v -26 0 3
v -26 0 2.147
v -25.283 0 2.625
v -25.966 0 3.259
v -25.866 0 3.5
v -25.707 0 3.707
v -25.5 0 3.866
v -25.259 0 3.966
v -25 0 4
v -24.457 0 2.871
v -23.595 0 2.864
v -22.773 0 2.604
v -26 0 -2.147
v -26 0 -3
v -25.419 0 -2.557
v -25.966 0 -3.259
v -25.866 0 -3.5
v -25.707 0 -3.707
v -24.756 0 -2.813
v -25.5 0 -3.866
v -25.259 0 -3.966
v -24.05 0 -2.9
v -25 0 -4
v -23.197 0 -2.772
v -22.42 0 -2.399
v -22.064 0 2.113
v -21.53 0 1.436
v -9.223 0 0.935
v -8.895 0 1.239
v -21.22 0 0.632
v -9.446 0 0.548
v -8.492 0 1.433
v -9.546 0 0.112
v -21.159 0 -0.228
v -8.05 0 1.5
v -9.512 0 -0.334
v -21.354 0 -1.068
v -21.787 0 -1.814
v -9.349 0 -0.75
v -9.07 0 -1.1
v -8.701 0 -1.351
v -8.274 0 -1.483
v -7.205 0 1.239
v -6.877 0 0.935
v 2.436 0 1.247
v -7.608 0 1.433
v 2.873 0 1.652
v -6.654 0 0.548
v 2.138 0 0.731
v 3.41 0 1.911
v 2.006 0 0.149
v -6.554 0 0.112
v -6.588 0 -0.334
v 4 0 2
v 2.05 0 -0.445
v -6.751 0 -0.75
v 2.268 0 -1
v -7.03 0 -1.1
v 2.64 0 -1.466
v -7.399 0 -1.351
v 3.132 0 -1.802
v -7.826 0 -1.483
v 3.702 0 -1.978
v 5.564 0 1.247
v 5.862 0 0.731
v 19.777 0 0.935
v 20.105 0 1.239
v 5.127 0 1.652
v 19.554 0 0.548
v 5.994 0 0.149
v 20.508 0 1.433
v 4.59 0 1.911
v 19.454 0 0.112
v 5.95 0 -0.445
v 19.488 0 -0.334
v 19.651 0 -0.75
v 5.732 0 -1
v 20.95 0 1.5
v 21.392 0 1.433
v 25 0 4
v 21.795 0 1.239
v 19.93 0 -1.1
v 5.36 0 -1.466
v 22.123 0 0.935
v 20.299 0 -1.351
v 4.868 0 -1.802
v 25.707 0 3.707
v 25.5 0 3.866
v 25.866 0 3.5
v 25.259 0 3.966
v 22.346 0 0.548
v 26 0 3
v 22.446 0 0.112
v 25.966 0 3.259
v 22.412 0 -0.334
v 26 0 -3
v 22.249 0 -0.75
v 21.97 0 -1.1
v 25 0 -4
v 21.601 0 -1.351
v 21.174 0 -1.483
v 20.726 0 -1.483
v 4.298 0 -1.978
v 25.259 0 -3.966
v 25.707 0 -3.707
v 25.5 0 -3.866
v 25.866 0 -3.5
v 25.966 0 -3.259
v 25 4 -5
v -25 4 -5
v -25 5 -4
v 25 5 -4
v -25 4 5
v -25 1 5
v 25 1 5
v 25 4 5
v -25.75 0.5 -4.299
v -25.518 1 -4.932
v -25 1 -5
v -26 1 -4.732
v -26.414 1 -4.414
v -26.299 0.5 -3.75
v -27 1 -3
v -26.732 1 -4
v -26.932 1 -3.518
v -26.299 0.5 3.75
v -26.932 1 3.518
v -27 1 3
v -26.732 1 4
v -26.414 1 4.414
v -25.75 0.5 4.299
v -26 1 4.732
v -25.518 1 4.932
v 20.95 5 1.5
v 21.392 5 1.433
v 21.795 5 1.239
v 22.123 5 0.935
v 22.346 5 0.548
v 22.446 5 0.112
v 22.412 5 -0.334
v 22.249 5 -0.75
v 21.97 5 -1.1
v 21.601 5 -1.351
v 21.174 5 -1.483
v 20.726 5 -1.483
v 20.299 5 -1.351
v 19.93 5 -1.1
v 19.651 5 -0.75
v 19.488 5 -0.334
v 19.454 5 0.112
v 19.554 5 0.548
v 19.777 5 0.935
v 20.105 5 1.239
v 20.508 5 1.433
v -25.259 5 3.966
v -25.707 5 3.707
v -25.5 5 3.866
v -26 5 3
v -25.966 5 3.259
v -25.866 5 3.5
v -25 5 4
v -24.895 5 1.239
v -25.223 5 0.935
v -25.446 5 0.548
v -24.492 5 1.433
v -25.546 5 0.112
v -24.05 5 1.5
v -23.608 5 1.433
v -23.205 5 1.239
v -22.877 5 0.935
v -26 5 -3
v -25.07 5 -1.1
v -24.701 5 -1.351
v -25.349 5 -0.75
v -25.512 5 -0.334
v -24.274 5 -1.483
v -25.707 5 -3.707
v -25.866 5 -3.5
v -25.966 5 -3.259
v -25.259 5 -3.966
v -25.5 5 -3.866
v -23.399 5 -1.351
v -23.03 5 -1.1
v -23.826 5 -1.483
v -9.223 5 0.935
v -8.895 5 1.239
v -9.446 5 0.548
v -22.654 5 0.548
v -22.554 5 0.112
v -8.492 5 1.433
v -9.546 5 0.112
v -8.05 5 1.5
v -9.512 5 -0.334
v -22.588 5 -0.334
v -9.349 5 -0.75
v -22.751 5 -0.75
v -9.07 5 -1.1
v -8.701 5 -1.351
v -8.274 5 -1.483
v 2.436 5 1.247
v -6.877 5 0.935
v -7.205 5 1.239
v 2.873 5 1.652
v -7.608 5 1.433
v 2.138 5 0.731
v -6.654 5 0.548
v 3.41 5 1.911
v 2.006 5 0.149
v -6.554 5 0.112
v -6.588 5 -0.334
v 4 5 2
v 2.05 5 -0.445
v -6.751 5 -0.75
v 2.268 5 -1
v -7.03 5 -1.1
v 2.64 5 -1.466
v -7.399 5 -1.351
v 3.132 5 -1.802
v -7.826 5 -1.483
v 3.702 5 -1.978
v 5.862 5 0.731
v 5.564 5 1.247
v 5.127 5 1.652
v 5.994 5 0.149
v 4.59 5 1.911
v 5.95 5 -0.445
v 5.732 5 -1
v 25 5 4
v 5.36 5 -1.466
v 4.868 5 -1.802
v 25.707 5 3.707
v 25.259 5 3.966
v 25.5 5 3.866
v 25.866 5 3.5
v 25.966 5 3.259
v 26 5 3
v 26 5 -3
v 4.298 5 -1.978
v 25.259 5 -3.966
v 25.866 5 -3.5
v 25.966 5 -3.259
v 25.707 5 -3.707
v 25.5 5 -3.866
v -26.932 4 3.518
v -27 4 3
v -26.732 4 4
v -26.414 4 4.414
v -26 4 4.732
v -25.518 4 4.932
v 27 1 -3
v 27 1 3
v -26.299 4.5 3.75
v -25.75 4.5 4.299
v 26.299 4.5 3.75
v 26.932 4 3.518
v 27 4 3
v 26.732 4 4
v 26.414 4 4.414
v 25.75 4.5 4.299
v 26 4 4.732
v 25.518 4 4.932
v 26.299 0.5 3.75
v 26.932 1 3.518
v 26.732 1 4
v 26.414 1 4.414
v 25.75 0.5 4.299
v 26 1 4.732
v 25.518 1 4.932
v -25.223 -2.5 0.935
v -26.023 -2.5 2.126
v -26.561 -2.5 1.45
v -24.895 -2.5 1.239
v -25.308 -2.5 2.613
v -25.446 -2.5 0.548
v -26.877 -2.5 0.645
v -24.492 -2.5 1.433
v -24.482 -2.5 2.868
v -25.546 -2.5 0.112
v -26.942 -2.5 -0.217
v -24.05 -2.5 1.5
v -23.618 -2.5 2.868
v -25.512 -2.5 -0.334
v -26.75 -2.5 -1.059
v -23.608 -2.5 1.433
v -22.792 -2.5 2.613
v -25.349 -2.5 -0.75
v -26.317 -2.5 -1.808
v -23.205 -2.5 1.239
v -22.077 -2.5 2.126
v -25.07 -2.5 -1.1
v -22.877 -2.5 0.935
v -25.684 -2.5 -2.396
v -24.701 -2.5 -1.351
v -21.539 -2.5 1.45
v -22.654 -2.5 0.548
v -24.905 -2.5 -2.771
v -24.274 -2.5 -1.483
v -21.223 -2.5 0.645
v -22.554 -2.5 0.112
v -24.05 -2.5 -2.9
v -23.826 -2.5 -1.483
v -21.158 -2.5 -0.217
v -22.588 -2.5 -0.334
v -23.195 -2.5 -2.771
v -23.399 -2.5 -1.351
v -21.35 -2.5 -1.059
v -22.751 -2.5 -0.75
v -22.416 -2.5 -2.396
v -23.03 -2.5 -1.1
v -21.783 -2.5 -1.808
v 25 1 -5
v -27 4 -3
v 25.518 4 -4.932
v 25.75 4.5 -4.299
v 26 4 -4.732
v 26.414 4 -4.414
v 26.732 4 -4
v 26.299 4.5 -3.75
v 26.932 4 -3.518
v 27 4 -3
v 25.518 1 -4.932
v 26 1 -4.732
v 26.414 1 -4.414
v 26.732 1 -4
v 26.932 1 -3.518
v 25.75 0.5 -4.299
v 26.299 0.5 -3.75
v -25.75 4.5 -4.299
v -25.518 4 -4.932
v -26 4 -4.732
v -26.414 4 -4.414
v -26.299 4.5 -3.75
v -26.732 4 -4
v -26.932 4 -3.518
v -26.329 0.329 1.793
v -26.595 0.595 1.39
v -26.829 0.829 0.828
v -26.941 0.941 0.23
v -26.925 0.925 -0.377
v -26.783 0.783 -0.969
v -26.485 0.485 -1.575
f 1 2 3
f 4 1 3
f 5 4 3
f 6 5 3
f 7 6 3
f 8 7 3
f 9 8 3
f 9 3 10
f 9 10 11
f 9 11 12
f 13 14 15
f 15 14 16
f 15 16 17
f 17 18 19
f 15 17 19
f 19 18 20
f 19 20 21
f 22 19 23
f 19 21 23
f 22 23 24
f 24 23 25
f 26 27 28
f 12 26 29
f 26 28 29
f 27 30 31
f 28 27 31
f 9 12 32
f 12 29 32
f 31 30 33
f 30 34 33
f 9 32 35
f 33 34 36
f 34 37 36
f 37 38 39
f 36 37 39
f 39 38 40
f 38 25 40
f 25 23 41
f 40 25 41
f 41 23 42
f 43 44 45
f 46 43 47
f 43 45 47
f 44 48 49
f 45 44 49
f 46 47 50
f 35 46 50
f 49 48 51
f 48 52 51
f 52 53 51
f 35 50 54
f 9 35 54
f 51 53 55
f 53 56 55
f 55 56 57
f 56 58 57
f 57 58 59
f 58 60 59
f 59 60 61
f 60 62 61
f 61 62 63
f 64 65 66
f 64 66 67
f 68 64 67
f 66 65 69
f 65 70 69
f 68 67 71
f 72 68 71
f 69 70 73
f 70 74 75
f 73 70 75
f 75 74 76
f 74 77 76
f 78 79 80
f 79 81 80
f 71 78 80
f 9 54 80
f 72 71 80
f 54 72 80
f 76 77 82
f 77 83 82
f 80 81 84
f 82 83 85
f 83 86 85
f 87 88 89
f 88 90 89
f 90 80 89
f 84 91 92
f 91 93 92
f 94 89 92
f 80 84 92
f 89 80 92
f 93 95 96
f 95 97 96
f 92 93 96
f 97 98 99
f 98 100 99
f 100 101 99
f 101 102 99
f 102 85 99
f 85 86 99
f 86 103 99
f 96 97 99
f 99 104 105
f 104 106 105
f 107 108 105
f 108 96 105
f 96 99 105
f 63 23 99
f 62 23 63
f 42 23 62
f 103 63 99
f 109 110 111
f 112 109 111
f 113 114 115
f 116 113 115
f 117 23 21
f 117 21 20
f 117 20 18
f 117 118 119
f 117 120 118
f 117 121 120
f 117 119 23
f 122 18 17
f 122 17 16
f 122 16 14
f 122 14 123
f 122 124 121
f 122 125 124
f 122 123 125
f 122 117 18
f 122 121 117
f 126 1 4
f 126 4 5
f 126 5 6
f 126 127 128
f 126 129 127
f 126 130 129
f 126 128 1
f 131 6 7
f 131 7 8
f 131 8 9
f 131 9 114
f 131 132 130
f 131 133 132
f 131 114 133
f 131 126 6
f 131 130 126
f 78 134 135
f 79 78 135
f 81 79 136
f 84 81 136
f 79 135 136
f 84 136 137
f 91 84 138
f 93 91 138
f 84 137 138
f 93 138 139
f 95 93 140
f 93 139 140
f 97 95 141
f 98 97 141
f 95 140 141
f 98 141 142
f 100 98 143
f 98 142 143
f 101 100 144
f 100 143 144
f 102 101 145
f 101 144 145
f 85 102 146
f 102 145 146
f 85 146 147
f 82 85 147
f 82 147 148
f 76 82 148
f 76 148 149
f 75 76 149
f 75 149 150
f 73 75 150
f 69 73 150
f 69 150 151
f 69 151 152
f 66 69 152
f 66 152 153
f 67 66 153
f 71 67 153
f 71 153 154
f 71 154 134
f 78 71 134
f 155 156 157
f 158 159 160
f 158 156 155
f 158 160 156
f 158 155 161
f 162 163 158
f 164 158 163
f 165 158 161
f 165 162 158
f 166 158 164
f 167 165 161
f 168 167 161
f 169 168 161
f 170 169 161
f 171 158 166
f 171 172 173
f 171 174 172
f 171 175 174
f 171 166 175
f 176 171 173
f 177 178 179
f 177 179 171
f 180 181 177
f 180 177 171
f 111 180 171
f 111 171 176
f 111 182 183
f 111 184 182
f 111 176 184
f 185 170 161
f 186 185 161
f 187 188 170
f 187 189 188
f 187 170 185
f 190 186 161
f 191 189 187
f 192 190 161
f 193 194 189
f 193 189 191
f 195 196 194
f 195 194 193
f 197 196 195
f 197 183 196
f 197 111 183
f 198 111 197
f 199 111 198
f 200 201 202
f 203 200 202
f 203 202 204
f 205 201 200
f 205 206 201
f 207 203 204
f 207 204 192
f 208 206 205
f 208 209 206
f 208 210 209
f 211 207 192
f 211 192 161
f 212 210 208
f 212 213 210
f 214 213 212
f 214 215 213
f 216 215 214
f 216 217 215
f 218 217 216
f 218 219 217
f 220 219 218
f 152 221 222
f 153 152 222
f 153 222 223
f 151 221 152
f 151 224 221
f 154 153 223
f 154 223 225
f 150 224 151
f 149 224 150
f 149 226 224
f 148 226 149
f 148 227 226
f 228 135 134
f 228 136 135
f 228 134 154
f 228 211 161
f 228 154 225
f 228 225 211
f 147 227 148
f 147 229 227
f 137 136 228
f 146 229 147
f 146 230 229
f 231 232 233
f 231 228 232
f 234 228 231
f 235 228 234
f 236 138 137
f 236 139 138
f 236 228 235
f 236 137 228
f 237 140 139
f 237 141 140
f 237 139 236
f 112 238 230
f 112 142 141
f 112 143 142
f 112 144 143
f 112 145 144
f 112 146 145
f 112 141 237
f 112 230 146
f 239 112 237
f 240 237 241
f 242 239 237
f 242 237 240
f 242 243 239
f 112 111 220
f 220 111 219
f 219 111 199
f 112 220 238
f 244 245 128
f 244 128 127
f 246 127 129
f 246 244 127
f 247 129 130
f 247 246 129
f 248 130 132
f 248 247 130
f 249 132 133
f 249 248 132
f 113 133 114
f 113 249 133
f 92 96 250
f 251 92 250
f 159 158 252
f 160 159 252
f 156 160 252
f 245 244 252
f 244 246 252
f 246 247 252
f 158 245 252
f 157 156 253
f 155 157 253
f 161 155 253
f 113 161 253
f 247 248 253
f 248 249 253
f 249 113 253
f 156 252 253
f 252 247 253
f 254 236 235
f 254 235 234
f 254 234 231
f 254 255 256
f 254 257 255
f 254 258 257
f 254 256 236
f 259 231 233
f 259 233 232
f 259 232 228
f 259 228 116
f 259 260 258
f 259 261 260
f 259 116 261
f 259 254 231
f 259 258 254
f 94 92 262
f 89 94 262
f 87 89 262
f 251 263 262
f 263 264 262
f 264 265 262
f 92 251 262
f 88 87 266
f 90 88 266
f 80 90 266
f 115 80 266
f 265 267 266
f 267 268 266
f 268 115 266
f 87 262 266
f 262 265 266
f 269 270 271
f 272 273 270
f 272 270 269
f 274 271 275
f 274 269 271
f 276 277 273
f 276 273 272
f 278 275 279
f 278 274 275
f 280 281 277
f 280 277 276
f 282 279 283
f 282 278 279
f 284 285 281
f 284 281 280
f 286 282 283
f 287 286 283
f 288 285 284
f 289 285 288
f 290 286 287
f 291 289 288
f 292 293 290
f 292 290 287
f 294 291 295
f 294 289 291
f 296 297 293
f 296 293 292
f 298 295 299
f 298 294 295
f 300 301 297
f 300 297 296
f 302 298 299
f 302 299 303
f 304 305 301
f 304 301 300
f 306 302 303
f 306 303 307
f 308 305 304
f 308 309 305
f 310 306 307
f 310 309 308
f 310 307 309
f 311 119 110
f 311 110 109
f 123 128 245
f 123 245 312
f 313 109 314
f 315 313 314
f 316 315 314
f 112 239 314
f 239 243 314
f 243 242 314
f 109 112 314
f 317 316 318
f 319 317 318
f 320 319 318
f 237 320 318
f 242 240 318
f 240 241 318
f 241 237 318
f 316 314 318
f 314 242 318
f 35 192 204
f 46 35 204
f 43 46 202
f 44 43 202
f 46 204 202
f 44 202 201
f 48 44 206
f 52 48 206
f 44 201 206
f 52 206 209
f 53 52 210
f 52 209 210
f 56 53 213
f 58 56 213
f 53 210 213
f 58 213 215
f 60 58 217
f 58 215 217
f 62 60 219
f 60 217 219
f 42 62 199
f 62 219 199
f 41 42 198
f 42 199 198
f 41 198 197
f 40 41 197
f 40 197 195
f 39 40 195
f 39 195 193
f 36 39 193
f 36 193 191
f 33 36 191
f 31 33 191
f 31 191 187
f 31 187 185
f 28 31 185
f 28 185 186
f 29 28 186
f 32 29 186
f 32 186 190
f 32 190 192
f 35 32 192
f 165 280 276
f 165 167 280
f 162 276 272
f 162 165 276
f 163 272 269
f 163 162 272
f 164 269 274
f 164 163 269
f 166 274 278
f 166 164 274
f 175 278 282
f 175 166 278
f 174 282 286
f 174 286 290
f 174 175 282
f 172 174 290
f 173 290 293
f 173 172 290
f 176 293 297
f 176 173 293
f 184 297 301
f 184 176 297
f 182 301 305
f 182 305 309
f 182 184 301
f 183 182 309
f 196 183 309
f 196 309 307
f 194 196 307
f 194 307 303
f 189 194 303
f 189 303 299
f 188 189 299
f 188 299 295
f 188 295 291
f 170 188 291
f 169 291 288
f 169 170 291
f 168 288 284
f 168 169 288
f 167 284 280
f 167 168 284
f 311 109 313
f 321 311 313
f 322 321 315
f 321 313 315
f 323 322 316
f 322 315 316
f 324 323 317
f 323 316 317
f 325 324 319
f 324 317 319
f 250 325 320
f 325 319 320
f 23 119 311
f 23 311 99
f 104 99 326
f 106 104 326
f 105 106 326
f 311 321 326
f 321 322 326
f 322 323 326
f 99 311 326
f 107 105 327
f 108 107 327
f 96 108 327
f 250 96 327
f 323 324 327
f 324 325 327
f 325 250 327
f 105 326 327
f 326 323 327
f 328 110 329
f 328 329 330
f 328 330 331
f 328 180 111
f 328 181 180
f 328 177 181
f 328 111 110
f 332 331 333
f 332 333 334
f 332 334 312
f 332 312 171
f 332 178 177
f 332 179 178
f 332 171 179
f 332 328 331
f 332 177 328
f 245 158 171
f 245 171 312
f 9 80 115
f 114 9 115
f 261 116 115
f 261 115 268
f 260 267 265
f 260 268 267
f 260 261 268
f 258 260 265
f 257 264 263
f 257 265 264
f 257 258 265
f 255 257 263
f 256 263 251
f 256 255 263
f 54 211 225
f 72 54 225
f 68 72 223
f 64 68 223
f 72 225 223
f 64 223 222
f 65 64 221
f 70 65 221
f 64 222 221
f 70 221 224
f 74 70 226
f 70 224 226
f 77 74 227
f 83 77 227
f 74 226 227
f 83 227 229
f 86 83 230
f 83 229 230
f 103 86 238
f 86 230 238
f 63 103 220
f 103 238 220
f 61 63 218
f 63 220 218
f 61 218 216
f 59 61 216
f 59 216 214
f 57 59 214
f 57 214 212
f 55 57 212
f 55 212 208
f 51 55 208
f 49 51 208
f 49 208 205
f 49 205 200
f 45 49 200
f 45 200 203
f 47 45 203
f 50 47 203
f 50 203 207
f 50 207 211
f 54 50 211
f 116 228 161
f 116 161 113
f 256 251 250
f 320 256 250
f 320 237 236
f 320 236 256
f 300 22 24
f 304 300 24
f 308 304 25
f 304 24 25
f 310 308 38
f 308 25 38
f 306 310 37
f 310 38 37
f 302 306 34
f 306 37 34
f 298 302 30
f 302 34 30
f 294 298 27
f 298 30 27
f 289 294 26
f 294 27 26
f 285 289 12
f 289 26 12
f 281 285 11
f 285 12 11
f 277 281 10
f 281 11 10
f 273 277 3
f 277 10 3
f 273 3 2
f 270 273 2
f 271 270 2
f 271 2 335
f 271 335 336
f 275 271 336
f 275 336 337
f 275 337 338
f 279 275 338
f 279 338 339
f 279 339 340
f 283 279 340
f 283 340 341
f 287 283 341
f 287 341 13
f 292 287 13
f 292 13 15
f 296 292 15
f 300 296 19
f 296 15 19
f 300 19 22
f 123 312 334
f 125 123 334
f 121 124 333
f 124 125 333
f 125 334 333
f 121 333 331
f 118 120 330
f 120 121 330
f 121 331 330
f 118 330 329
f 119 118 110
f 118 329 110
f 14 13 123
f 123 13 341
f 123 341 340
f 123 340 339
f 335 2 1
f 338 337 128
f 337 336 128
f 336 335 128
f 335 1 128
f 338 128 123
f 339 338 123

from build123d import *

# Parameters (mm, degrees)
SKETCH1_W           = 54
SKETCH1_H           = 10
BOSS_EXTRUDE1_DEPTH = 5
SKETCH3_R           = 1.5
SKETCH3_R_2         = 2
CUT_EXTRUDE1_DEPTH  = 7
FILLET1_R           = 2
SKETCH4_R           = 2.9
SKETCH4_R_2         = 1.5
BOSS_EXTRUDE2_DEPTH = 2.5
CHAMFER1_SIZE       = 1


with BuildPart() as part:
    # Sketch1 → Boss-Extrude1 (new body)
    with BuildSketch(Plane(origin=(0, 0, 0), x_dir=(1, 0, 0), z_dir=(0, 1, 0))):
        Rectangle(SKETCH1_W, SKETCH1_H)
    extrude(amount=BOSS_EXTRUDE1_DEPTH)

    # Sketch3 → Cut-Extrude1 (cut)
    with BuildSketch(Plane(origin=(0, 5, 0), x_dir=(1, 0, 0), z_dir=(0, 1, 0))):
        with Locations(Location((-24.05, 0, 0), (0, 0, 270))):
            Circle(SKETCH3_R)
        with Locations(Location((4, 0, 0), (0, 0, 270))):
            Circle(SKETCH3_R_2)
        with Locations(Location((-8.05, 0, 0), (0, 0, 270))):
            Circle(SKETCH3_R)
        with Locations(Location((20.95, 0, 0), (0, 0, 270))):
            Circle(SKETCH3_R)
    extrude(amount=-CUT_EXTRUDE1_DEPTH, mode=Mode.SUBTRACT)

    # Fillet1
    fillet1_edges = [part.edges().sort_by_distance(p)[0] for p in [
        (27, 2.5, 5),
        (-27, 2.5, 5),
        (-27, 2.5, -5),
        (27, 2.5, -5),
    ]]
    fillet(fillet1_edges, radius=FILLET1_R)

    # Sketch4 → Boss-Extrude2 (add)
    with BuildSketch(Plane.XZ):
        with Locations(Location((-24.05, 0, 0), (0, 0, 270))):
            Circle(SKETCH4_R)
        with Locations(Location((-24.05, 0, 0), (0, 0, 90))):
            Circle(SKETCH4_R_2, mode=Mode.SUBTRACT)
    extrude(amount=BOSS_EXTRUDE2_DEPTH)

    # Chamfer1
    # the kernel refuses this chamfer: 1 mm, written as the material it takes off along each edge
    with BuildSketch(Plane(origin=(-25, 0, -5), x_dir=(0, 0.9996219169112968, -0.027495876610586494), z_dir=(1, 0, 0)), Plane(origin=(25, 5, 5), x_dir=(0, 0.027495876610586487, -0.9996219169112968), z_dir=(-1, 0, 0))) as chamfer1_piece_1:
        Polygon((CHAMFER1_SIZE * 0.999621916911, CHAMFER1_SIZE * 0.0274958766106), (-CHAMFER1_SIZE * 0.0274958766106, CHAMFER1_SIZE * 0.999621916911), (0, 0), align=None)
    extrude(amount=50, mode=Mode.SUBTRACT)
    with BuildSketch(Plane(origin=(-25, 5, -5), x_dir=(0, -0.9996219169112968, -0.027495876610586487), z_dir=(1, 0, 0)), Plane(origin=(25, 0, 5), x_dir=(0, -0.027495876610586365, -0.9996219169112968), z_dir=(-1, 0, 0))) as chamfer1_piece_2:
        Polygon((CHAMFER1_SIZE * 0.999621916911, -CHAMFER1_SIZE * 0.0274958766106), (-CHAMFER1_SIZE * 0.0274958766106, -CHAMFER1_SIZE * 0.999621916911), (0, 0), align=None)
    extrude(amount=50, mode=Mode.SUBTRACT)
    with BuildSketch(Plane(origin=(27, 0, -3), x_dir=(-0.9996219169112968, -0.02749587661058639, 0), z_dir=(0, 0, 1))) as chamfer1_piece_3:
        Polygon((CHAMFER1_SIZE * 0.999621916911, -CHAMFER1_SIZE * 0.0274958766106), (-CHAMFER1_SIZE * 0.0274958766106, -CHAMFER1_SIZE * 0.999621916911), (0, 0), align=None)
    extrude(amount=6, mode=Mode.SUBTRACT)
    with BuildSketch(Plane(origin=(-27, 0, 3), x_dir=(0.9996219169112968, -0.02749587661058639, 0), z_dir=(0, 0, -1))) as chamfer1_piece_4_section:
        Polygon((CHAMFER1_SIZE * 0.999621916911, -CHAMFER1_SIZE * 0.0274958766106), (-CHAMFER1_SIZE * 0.0274958766106, -CHAMFER1_SIZE * 0.999621916911), (0, 0), align=None)
    chamfer1_piece_4 = extrude(amount=6, mode=Mode.PRIVATE)
    chamfer1_piece_4 = chamfer1_piece_4 - Plane(origin=(-24.05, 0.490897833, 0), x_dir=(0, 0, -1), z_dir=(0, 1, 0)) * Cylinder(2.9, 16, mode=Mode.PRIVATE)
    add(chamfer1_piece_4, mode=Mode.SUBTRACT)
    with BuildSketch(Plane(origin=(-25, 0, 3), x_dir=(-1, 0, 0), z_dir=(0, 0, -1))) as chamfer1_piece_5:
        Polygon((2 - CHAMFER1_SIZE, 0), (2, CHAMFER1_SIZE), (2, 0), align=None)
    revolve(axis=Axis((-25, 0, 3), (0, 1, 0)), revolution_arc=90, mode=Mode.SUBTRACT)
    with BuildSketch(Plane(origin=(25, 0, 3), x_dir=(1, 0, 0), z_dir=(0, 0, -1))) as chamfer1_piece_6:
        Polygon((2 - CHAMFER1_SIZE, 0), (2, -CHAMFER1_SIZE), (2, 0), align=None)
    revolve(axis=Axis((25, 0, 3), (0, -1, 0)), revolution_arc=90, mode=Mode.SUBTRACT)
    with BuildSketch(Plane(origin=(-25, 0, -3), x_dir=(0, 0, -1), z_dir=(1, 0, 0))) as chamfer1_piece_7:
        Polygon((2 - CHAMFER1_SIZE, 0), (2, CHAMFER1_SIZE), (2, 0), align=None)
    revolve(axis=Axis((-25, 0, -3), (0, 1, 0)), revolution_arc=90, mode=Mode.SUBTRACT)
    with BuildSketch(Plane(origin=(25, 0, -3), x_dir=(0, 0, -1), z_dir=(-1, 0, 0))) as chamfer1_piece_8:
        Polygon((2 - CHAMFER1_SIZE, 0), (2, -CHAMFER1_SIZE), (2, 0), align=None)
    revolve(axis=Axis((25, 0, -3), (0, -1, 0)), revolution_arc=90, mode=Mode.SUBTRACT)
    with BuildSketch(Plane(origin=(27, 5, -3), x_dir=(-0.9996219169112968, 0.02749587661058651, 0), z_dir=(0, 0, 1)), Plane(origin=(-27, 5, 3), x_dir=(0.9996219169112968, 0.02749587661058651, 0), z_dir=(0, 0, -1))) as chamfer1_piece_9:
        Polygon((CHAMFER1_SIZE * 0.999621916911, CHAMFER1_SIZE * 0.0274958766106), (-CHAMFER1_SIZE * 0.0274958766106, CHAMFER1_SIZE * 0.999621916911), (0, 0), align=None)
    extrude(amount=6, mode=Mode.SUBTRACT)
    with BuildSketch(Plane(origin=(-25, 5, 3), x_dir=(-1, 0, 0), z_dir=(0, 0, -1))) as chamfer1_piece_10:
        Polygon((2 - CHAMFER1_SIZE, 0), (2, -CHAMFER1_SIZE), (2, 0), align=None)
    revolve(axis=Axis((-25, 5, 3), (0, 1, 0)), revolution_arc=90, mode=Mode.SUBTRACT)
    with BuildSketch(Plane(origin=(25, 5, 3), x_dir=(1, 0, 0), z_dir=(0, 0, -1))) as chamfer1_piece_11:
        Polygon((2 - CHAMFER1_SIZE, 0), (2, CHAMFER1_SIZE), (2, 0), align=None)
    revolve(axis=Axis((25, 5, 3), (0, -1, 0)), revolution_arc=90, mode=Mode.SUBTRACT)
    with BuildSketch(Plane(origin=(-25, 5, -3), x_dir=(0, 0, -1), z_dir=(1, 0, 0))) as chamfer1_piece_12:
        Polygon((2, -CHAMFER1_SIZE), (2 - CHAMFER1_SIZE, 0), (2, 0), align=None)
    revolve(axis=Axis((-25, 5, -3), (0, 1, 0)), revolution_arc=90, mode=Mode.SUBTRACT)
    with BuildSketch(Plane(origin=(25, 5, -3), x_dir=(0, 0, -1), z_dir=(-1, 0, 0))) as chamfer1_piece_13:
        Polygon((2, CHAMFER1_SIZE), (2 - CHAMFER1_SIZE, 0), (2, 0), align=None)
    revolve(axis=Axis((25, 5, -3), (0, -1, 0)), revolution_arc=90, mode=Mode.SUBTRACT)


solid = part.part
